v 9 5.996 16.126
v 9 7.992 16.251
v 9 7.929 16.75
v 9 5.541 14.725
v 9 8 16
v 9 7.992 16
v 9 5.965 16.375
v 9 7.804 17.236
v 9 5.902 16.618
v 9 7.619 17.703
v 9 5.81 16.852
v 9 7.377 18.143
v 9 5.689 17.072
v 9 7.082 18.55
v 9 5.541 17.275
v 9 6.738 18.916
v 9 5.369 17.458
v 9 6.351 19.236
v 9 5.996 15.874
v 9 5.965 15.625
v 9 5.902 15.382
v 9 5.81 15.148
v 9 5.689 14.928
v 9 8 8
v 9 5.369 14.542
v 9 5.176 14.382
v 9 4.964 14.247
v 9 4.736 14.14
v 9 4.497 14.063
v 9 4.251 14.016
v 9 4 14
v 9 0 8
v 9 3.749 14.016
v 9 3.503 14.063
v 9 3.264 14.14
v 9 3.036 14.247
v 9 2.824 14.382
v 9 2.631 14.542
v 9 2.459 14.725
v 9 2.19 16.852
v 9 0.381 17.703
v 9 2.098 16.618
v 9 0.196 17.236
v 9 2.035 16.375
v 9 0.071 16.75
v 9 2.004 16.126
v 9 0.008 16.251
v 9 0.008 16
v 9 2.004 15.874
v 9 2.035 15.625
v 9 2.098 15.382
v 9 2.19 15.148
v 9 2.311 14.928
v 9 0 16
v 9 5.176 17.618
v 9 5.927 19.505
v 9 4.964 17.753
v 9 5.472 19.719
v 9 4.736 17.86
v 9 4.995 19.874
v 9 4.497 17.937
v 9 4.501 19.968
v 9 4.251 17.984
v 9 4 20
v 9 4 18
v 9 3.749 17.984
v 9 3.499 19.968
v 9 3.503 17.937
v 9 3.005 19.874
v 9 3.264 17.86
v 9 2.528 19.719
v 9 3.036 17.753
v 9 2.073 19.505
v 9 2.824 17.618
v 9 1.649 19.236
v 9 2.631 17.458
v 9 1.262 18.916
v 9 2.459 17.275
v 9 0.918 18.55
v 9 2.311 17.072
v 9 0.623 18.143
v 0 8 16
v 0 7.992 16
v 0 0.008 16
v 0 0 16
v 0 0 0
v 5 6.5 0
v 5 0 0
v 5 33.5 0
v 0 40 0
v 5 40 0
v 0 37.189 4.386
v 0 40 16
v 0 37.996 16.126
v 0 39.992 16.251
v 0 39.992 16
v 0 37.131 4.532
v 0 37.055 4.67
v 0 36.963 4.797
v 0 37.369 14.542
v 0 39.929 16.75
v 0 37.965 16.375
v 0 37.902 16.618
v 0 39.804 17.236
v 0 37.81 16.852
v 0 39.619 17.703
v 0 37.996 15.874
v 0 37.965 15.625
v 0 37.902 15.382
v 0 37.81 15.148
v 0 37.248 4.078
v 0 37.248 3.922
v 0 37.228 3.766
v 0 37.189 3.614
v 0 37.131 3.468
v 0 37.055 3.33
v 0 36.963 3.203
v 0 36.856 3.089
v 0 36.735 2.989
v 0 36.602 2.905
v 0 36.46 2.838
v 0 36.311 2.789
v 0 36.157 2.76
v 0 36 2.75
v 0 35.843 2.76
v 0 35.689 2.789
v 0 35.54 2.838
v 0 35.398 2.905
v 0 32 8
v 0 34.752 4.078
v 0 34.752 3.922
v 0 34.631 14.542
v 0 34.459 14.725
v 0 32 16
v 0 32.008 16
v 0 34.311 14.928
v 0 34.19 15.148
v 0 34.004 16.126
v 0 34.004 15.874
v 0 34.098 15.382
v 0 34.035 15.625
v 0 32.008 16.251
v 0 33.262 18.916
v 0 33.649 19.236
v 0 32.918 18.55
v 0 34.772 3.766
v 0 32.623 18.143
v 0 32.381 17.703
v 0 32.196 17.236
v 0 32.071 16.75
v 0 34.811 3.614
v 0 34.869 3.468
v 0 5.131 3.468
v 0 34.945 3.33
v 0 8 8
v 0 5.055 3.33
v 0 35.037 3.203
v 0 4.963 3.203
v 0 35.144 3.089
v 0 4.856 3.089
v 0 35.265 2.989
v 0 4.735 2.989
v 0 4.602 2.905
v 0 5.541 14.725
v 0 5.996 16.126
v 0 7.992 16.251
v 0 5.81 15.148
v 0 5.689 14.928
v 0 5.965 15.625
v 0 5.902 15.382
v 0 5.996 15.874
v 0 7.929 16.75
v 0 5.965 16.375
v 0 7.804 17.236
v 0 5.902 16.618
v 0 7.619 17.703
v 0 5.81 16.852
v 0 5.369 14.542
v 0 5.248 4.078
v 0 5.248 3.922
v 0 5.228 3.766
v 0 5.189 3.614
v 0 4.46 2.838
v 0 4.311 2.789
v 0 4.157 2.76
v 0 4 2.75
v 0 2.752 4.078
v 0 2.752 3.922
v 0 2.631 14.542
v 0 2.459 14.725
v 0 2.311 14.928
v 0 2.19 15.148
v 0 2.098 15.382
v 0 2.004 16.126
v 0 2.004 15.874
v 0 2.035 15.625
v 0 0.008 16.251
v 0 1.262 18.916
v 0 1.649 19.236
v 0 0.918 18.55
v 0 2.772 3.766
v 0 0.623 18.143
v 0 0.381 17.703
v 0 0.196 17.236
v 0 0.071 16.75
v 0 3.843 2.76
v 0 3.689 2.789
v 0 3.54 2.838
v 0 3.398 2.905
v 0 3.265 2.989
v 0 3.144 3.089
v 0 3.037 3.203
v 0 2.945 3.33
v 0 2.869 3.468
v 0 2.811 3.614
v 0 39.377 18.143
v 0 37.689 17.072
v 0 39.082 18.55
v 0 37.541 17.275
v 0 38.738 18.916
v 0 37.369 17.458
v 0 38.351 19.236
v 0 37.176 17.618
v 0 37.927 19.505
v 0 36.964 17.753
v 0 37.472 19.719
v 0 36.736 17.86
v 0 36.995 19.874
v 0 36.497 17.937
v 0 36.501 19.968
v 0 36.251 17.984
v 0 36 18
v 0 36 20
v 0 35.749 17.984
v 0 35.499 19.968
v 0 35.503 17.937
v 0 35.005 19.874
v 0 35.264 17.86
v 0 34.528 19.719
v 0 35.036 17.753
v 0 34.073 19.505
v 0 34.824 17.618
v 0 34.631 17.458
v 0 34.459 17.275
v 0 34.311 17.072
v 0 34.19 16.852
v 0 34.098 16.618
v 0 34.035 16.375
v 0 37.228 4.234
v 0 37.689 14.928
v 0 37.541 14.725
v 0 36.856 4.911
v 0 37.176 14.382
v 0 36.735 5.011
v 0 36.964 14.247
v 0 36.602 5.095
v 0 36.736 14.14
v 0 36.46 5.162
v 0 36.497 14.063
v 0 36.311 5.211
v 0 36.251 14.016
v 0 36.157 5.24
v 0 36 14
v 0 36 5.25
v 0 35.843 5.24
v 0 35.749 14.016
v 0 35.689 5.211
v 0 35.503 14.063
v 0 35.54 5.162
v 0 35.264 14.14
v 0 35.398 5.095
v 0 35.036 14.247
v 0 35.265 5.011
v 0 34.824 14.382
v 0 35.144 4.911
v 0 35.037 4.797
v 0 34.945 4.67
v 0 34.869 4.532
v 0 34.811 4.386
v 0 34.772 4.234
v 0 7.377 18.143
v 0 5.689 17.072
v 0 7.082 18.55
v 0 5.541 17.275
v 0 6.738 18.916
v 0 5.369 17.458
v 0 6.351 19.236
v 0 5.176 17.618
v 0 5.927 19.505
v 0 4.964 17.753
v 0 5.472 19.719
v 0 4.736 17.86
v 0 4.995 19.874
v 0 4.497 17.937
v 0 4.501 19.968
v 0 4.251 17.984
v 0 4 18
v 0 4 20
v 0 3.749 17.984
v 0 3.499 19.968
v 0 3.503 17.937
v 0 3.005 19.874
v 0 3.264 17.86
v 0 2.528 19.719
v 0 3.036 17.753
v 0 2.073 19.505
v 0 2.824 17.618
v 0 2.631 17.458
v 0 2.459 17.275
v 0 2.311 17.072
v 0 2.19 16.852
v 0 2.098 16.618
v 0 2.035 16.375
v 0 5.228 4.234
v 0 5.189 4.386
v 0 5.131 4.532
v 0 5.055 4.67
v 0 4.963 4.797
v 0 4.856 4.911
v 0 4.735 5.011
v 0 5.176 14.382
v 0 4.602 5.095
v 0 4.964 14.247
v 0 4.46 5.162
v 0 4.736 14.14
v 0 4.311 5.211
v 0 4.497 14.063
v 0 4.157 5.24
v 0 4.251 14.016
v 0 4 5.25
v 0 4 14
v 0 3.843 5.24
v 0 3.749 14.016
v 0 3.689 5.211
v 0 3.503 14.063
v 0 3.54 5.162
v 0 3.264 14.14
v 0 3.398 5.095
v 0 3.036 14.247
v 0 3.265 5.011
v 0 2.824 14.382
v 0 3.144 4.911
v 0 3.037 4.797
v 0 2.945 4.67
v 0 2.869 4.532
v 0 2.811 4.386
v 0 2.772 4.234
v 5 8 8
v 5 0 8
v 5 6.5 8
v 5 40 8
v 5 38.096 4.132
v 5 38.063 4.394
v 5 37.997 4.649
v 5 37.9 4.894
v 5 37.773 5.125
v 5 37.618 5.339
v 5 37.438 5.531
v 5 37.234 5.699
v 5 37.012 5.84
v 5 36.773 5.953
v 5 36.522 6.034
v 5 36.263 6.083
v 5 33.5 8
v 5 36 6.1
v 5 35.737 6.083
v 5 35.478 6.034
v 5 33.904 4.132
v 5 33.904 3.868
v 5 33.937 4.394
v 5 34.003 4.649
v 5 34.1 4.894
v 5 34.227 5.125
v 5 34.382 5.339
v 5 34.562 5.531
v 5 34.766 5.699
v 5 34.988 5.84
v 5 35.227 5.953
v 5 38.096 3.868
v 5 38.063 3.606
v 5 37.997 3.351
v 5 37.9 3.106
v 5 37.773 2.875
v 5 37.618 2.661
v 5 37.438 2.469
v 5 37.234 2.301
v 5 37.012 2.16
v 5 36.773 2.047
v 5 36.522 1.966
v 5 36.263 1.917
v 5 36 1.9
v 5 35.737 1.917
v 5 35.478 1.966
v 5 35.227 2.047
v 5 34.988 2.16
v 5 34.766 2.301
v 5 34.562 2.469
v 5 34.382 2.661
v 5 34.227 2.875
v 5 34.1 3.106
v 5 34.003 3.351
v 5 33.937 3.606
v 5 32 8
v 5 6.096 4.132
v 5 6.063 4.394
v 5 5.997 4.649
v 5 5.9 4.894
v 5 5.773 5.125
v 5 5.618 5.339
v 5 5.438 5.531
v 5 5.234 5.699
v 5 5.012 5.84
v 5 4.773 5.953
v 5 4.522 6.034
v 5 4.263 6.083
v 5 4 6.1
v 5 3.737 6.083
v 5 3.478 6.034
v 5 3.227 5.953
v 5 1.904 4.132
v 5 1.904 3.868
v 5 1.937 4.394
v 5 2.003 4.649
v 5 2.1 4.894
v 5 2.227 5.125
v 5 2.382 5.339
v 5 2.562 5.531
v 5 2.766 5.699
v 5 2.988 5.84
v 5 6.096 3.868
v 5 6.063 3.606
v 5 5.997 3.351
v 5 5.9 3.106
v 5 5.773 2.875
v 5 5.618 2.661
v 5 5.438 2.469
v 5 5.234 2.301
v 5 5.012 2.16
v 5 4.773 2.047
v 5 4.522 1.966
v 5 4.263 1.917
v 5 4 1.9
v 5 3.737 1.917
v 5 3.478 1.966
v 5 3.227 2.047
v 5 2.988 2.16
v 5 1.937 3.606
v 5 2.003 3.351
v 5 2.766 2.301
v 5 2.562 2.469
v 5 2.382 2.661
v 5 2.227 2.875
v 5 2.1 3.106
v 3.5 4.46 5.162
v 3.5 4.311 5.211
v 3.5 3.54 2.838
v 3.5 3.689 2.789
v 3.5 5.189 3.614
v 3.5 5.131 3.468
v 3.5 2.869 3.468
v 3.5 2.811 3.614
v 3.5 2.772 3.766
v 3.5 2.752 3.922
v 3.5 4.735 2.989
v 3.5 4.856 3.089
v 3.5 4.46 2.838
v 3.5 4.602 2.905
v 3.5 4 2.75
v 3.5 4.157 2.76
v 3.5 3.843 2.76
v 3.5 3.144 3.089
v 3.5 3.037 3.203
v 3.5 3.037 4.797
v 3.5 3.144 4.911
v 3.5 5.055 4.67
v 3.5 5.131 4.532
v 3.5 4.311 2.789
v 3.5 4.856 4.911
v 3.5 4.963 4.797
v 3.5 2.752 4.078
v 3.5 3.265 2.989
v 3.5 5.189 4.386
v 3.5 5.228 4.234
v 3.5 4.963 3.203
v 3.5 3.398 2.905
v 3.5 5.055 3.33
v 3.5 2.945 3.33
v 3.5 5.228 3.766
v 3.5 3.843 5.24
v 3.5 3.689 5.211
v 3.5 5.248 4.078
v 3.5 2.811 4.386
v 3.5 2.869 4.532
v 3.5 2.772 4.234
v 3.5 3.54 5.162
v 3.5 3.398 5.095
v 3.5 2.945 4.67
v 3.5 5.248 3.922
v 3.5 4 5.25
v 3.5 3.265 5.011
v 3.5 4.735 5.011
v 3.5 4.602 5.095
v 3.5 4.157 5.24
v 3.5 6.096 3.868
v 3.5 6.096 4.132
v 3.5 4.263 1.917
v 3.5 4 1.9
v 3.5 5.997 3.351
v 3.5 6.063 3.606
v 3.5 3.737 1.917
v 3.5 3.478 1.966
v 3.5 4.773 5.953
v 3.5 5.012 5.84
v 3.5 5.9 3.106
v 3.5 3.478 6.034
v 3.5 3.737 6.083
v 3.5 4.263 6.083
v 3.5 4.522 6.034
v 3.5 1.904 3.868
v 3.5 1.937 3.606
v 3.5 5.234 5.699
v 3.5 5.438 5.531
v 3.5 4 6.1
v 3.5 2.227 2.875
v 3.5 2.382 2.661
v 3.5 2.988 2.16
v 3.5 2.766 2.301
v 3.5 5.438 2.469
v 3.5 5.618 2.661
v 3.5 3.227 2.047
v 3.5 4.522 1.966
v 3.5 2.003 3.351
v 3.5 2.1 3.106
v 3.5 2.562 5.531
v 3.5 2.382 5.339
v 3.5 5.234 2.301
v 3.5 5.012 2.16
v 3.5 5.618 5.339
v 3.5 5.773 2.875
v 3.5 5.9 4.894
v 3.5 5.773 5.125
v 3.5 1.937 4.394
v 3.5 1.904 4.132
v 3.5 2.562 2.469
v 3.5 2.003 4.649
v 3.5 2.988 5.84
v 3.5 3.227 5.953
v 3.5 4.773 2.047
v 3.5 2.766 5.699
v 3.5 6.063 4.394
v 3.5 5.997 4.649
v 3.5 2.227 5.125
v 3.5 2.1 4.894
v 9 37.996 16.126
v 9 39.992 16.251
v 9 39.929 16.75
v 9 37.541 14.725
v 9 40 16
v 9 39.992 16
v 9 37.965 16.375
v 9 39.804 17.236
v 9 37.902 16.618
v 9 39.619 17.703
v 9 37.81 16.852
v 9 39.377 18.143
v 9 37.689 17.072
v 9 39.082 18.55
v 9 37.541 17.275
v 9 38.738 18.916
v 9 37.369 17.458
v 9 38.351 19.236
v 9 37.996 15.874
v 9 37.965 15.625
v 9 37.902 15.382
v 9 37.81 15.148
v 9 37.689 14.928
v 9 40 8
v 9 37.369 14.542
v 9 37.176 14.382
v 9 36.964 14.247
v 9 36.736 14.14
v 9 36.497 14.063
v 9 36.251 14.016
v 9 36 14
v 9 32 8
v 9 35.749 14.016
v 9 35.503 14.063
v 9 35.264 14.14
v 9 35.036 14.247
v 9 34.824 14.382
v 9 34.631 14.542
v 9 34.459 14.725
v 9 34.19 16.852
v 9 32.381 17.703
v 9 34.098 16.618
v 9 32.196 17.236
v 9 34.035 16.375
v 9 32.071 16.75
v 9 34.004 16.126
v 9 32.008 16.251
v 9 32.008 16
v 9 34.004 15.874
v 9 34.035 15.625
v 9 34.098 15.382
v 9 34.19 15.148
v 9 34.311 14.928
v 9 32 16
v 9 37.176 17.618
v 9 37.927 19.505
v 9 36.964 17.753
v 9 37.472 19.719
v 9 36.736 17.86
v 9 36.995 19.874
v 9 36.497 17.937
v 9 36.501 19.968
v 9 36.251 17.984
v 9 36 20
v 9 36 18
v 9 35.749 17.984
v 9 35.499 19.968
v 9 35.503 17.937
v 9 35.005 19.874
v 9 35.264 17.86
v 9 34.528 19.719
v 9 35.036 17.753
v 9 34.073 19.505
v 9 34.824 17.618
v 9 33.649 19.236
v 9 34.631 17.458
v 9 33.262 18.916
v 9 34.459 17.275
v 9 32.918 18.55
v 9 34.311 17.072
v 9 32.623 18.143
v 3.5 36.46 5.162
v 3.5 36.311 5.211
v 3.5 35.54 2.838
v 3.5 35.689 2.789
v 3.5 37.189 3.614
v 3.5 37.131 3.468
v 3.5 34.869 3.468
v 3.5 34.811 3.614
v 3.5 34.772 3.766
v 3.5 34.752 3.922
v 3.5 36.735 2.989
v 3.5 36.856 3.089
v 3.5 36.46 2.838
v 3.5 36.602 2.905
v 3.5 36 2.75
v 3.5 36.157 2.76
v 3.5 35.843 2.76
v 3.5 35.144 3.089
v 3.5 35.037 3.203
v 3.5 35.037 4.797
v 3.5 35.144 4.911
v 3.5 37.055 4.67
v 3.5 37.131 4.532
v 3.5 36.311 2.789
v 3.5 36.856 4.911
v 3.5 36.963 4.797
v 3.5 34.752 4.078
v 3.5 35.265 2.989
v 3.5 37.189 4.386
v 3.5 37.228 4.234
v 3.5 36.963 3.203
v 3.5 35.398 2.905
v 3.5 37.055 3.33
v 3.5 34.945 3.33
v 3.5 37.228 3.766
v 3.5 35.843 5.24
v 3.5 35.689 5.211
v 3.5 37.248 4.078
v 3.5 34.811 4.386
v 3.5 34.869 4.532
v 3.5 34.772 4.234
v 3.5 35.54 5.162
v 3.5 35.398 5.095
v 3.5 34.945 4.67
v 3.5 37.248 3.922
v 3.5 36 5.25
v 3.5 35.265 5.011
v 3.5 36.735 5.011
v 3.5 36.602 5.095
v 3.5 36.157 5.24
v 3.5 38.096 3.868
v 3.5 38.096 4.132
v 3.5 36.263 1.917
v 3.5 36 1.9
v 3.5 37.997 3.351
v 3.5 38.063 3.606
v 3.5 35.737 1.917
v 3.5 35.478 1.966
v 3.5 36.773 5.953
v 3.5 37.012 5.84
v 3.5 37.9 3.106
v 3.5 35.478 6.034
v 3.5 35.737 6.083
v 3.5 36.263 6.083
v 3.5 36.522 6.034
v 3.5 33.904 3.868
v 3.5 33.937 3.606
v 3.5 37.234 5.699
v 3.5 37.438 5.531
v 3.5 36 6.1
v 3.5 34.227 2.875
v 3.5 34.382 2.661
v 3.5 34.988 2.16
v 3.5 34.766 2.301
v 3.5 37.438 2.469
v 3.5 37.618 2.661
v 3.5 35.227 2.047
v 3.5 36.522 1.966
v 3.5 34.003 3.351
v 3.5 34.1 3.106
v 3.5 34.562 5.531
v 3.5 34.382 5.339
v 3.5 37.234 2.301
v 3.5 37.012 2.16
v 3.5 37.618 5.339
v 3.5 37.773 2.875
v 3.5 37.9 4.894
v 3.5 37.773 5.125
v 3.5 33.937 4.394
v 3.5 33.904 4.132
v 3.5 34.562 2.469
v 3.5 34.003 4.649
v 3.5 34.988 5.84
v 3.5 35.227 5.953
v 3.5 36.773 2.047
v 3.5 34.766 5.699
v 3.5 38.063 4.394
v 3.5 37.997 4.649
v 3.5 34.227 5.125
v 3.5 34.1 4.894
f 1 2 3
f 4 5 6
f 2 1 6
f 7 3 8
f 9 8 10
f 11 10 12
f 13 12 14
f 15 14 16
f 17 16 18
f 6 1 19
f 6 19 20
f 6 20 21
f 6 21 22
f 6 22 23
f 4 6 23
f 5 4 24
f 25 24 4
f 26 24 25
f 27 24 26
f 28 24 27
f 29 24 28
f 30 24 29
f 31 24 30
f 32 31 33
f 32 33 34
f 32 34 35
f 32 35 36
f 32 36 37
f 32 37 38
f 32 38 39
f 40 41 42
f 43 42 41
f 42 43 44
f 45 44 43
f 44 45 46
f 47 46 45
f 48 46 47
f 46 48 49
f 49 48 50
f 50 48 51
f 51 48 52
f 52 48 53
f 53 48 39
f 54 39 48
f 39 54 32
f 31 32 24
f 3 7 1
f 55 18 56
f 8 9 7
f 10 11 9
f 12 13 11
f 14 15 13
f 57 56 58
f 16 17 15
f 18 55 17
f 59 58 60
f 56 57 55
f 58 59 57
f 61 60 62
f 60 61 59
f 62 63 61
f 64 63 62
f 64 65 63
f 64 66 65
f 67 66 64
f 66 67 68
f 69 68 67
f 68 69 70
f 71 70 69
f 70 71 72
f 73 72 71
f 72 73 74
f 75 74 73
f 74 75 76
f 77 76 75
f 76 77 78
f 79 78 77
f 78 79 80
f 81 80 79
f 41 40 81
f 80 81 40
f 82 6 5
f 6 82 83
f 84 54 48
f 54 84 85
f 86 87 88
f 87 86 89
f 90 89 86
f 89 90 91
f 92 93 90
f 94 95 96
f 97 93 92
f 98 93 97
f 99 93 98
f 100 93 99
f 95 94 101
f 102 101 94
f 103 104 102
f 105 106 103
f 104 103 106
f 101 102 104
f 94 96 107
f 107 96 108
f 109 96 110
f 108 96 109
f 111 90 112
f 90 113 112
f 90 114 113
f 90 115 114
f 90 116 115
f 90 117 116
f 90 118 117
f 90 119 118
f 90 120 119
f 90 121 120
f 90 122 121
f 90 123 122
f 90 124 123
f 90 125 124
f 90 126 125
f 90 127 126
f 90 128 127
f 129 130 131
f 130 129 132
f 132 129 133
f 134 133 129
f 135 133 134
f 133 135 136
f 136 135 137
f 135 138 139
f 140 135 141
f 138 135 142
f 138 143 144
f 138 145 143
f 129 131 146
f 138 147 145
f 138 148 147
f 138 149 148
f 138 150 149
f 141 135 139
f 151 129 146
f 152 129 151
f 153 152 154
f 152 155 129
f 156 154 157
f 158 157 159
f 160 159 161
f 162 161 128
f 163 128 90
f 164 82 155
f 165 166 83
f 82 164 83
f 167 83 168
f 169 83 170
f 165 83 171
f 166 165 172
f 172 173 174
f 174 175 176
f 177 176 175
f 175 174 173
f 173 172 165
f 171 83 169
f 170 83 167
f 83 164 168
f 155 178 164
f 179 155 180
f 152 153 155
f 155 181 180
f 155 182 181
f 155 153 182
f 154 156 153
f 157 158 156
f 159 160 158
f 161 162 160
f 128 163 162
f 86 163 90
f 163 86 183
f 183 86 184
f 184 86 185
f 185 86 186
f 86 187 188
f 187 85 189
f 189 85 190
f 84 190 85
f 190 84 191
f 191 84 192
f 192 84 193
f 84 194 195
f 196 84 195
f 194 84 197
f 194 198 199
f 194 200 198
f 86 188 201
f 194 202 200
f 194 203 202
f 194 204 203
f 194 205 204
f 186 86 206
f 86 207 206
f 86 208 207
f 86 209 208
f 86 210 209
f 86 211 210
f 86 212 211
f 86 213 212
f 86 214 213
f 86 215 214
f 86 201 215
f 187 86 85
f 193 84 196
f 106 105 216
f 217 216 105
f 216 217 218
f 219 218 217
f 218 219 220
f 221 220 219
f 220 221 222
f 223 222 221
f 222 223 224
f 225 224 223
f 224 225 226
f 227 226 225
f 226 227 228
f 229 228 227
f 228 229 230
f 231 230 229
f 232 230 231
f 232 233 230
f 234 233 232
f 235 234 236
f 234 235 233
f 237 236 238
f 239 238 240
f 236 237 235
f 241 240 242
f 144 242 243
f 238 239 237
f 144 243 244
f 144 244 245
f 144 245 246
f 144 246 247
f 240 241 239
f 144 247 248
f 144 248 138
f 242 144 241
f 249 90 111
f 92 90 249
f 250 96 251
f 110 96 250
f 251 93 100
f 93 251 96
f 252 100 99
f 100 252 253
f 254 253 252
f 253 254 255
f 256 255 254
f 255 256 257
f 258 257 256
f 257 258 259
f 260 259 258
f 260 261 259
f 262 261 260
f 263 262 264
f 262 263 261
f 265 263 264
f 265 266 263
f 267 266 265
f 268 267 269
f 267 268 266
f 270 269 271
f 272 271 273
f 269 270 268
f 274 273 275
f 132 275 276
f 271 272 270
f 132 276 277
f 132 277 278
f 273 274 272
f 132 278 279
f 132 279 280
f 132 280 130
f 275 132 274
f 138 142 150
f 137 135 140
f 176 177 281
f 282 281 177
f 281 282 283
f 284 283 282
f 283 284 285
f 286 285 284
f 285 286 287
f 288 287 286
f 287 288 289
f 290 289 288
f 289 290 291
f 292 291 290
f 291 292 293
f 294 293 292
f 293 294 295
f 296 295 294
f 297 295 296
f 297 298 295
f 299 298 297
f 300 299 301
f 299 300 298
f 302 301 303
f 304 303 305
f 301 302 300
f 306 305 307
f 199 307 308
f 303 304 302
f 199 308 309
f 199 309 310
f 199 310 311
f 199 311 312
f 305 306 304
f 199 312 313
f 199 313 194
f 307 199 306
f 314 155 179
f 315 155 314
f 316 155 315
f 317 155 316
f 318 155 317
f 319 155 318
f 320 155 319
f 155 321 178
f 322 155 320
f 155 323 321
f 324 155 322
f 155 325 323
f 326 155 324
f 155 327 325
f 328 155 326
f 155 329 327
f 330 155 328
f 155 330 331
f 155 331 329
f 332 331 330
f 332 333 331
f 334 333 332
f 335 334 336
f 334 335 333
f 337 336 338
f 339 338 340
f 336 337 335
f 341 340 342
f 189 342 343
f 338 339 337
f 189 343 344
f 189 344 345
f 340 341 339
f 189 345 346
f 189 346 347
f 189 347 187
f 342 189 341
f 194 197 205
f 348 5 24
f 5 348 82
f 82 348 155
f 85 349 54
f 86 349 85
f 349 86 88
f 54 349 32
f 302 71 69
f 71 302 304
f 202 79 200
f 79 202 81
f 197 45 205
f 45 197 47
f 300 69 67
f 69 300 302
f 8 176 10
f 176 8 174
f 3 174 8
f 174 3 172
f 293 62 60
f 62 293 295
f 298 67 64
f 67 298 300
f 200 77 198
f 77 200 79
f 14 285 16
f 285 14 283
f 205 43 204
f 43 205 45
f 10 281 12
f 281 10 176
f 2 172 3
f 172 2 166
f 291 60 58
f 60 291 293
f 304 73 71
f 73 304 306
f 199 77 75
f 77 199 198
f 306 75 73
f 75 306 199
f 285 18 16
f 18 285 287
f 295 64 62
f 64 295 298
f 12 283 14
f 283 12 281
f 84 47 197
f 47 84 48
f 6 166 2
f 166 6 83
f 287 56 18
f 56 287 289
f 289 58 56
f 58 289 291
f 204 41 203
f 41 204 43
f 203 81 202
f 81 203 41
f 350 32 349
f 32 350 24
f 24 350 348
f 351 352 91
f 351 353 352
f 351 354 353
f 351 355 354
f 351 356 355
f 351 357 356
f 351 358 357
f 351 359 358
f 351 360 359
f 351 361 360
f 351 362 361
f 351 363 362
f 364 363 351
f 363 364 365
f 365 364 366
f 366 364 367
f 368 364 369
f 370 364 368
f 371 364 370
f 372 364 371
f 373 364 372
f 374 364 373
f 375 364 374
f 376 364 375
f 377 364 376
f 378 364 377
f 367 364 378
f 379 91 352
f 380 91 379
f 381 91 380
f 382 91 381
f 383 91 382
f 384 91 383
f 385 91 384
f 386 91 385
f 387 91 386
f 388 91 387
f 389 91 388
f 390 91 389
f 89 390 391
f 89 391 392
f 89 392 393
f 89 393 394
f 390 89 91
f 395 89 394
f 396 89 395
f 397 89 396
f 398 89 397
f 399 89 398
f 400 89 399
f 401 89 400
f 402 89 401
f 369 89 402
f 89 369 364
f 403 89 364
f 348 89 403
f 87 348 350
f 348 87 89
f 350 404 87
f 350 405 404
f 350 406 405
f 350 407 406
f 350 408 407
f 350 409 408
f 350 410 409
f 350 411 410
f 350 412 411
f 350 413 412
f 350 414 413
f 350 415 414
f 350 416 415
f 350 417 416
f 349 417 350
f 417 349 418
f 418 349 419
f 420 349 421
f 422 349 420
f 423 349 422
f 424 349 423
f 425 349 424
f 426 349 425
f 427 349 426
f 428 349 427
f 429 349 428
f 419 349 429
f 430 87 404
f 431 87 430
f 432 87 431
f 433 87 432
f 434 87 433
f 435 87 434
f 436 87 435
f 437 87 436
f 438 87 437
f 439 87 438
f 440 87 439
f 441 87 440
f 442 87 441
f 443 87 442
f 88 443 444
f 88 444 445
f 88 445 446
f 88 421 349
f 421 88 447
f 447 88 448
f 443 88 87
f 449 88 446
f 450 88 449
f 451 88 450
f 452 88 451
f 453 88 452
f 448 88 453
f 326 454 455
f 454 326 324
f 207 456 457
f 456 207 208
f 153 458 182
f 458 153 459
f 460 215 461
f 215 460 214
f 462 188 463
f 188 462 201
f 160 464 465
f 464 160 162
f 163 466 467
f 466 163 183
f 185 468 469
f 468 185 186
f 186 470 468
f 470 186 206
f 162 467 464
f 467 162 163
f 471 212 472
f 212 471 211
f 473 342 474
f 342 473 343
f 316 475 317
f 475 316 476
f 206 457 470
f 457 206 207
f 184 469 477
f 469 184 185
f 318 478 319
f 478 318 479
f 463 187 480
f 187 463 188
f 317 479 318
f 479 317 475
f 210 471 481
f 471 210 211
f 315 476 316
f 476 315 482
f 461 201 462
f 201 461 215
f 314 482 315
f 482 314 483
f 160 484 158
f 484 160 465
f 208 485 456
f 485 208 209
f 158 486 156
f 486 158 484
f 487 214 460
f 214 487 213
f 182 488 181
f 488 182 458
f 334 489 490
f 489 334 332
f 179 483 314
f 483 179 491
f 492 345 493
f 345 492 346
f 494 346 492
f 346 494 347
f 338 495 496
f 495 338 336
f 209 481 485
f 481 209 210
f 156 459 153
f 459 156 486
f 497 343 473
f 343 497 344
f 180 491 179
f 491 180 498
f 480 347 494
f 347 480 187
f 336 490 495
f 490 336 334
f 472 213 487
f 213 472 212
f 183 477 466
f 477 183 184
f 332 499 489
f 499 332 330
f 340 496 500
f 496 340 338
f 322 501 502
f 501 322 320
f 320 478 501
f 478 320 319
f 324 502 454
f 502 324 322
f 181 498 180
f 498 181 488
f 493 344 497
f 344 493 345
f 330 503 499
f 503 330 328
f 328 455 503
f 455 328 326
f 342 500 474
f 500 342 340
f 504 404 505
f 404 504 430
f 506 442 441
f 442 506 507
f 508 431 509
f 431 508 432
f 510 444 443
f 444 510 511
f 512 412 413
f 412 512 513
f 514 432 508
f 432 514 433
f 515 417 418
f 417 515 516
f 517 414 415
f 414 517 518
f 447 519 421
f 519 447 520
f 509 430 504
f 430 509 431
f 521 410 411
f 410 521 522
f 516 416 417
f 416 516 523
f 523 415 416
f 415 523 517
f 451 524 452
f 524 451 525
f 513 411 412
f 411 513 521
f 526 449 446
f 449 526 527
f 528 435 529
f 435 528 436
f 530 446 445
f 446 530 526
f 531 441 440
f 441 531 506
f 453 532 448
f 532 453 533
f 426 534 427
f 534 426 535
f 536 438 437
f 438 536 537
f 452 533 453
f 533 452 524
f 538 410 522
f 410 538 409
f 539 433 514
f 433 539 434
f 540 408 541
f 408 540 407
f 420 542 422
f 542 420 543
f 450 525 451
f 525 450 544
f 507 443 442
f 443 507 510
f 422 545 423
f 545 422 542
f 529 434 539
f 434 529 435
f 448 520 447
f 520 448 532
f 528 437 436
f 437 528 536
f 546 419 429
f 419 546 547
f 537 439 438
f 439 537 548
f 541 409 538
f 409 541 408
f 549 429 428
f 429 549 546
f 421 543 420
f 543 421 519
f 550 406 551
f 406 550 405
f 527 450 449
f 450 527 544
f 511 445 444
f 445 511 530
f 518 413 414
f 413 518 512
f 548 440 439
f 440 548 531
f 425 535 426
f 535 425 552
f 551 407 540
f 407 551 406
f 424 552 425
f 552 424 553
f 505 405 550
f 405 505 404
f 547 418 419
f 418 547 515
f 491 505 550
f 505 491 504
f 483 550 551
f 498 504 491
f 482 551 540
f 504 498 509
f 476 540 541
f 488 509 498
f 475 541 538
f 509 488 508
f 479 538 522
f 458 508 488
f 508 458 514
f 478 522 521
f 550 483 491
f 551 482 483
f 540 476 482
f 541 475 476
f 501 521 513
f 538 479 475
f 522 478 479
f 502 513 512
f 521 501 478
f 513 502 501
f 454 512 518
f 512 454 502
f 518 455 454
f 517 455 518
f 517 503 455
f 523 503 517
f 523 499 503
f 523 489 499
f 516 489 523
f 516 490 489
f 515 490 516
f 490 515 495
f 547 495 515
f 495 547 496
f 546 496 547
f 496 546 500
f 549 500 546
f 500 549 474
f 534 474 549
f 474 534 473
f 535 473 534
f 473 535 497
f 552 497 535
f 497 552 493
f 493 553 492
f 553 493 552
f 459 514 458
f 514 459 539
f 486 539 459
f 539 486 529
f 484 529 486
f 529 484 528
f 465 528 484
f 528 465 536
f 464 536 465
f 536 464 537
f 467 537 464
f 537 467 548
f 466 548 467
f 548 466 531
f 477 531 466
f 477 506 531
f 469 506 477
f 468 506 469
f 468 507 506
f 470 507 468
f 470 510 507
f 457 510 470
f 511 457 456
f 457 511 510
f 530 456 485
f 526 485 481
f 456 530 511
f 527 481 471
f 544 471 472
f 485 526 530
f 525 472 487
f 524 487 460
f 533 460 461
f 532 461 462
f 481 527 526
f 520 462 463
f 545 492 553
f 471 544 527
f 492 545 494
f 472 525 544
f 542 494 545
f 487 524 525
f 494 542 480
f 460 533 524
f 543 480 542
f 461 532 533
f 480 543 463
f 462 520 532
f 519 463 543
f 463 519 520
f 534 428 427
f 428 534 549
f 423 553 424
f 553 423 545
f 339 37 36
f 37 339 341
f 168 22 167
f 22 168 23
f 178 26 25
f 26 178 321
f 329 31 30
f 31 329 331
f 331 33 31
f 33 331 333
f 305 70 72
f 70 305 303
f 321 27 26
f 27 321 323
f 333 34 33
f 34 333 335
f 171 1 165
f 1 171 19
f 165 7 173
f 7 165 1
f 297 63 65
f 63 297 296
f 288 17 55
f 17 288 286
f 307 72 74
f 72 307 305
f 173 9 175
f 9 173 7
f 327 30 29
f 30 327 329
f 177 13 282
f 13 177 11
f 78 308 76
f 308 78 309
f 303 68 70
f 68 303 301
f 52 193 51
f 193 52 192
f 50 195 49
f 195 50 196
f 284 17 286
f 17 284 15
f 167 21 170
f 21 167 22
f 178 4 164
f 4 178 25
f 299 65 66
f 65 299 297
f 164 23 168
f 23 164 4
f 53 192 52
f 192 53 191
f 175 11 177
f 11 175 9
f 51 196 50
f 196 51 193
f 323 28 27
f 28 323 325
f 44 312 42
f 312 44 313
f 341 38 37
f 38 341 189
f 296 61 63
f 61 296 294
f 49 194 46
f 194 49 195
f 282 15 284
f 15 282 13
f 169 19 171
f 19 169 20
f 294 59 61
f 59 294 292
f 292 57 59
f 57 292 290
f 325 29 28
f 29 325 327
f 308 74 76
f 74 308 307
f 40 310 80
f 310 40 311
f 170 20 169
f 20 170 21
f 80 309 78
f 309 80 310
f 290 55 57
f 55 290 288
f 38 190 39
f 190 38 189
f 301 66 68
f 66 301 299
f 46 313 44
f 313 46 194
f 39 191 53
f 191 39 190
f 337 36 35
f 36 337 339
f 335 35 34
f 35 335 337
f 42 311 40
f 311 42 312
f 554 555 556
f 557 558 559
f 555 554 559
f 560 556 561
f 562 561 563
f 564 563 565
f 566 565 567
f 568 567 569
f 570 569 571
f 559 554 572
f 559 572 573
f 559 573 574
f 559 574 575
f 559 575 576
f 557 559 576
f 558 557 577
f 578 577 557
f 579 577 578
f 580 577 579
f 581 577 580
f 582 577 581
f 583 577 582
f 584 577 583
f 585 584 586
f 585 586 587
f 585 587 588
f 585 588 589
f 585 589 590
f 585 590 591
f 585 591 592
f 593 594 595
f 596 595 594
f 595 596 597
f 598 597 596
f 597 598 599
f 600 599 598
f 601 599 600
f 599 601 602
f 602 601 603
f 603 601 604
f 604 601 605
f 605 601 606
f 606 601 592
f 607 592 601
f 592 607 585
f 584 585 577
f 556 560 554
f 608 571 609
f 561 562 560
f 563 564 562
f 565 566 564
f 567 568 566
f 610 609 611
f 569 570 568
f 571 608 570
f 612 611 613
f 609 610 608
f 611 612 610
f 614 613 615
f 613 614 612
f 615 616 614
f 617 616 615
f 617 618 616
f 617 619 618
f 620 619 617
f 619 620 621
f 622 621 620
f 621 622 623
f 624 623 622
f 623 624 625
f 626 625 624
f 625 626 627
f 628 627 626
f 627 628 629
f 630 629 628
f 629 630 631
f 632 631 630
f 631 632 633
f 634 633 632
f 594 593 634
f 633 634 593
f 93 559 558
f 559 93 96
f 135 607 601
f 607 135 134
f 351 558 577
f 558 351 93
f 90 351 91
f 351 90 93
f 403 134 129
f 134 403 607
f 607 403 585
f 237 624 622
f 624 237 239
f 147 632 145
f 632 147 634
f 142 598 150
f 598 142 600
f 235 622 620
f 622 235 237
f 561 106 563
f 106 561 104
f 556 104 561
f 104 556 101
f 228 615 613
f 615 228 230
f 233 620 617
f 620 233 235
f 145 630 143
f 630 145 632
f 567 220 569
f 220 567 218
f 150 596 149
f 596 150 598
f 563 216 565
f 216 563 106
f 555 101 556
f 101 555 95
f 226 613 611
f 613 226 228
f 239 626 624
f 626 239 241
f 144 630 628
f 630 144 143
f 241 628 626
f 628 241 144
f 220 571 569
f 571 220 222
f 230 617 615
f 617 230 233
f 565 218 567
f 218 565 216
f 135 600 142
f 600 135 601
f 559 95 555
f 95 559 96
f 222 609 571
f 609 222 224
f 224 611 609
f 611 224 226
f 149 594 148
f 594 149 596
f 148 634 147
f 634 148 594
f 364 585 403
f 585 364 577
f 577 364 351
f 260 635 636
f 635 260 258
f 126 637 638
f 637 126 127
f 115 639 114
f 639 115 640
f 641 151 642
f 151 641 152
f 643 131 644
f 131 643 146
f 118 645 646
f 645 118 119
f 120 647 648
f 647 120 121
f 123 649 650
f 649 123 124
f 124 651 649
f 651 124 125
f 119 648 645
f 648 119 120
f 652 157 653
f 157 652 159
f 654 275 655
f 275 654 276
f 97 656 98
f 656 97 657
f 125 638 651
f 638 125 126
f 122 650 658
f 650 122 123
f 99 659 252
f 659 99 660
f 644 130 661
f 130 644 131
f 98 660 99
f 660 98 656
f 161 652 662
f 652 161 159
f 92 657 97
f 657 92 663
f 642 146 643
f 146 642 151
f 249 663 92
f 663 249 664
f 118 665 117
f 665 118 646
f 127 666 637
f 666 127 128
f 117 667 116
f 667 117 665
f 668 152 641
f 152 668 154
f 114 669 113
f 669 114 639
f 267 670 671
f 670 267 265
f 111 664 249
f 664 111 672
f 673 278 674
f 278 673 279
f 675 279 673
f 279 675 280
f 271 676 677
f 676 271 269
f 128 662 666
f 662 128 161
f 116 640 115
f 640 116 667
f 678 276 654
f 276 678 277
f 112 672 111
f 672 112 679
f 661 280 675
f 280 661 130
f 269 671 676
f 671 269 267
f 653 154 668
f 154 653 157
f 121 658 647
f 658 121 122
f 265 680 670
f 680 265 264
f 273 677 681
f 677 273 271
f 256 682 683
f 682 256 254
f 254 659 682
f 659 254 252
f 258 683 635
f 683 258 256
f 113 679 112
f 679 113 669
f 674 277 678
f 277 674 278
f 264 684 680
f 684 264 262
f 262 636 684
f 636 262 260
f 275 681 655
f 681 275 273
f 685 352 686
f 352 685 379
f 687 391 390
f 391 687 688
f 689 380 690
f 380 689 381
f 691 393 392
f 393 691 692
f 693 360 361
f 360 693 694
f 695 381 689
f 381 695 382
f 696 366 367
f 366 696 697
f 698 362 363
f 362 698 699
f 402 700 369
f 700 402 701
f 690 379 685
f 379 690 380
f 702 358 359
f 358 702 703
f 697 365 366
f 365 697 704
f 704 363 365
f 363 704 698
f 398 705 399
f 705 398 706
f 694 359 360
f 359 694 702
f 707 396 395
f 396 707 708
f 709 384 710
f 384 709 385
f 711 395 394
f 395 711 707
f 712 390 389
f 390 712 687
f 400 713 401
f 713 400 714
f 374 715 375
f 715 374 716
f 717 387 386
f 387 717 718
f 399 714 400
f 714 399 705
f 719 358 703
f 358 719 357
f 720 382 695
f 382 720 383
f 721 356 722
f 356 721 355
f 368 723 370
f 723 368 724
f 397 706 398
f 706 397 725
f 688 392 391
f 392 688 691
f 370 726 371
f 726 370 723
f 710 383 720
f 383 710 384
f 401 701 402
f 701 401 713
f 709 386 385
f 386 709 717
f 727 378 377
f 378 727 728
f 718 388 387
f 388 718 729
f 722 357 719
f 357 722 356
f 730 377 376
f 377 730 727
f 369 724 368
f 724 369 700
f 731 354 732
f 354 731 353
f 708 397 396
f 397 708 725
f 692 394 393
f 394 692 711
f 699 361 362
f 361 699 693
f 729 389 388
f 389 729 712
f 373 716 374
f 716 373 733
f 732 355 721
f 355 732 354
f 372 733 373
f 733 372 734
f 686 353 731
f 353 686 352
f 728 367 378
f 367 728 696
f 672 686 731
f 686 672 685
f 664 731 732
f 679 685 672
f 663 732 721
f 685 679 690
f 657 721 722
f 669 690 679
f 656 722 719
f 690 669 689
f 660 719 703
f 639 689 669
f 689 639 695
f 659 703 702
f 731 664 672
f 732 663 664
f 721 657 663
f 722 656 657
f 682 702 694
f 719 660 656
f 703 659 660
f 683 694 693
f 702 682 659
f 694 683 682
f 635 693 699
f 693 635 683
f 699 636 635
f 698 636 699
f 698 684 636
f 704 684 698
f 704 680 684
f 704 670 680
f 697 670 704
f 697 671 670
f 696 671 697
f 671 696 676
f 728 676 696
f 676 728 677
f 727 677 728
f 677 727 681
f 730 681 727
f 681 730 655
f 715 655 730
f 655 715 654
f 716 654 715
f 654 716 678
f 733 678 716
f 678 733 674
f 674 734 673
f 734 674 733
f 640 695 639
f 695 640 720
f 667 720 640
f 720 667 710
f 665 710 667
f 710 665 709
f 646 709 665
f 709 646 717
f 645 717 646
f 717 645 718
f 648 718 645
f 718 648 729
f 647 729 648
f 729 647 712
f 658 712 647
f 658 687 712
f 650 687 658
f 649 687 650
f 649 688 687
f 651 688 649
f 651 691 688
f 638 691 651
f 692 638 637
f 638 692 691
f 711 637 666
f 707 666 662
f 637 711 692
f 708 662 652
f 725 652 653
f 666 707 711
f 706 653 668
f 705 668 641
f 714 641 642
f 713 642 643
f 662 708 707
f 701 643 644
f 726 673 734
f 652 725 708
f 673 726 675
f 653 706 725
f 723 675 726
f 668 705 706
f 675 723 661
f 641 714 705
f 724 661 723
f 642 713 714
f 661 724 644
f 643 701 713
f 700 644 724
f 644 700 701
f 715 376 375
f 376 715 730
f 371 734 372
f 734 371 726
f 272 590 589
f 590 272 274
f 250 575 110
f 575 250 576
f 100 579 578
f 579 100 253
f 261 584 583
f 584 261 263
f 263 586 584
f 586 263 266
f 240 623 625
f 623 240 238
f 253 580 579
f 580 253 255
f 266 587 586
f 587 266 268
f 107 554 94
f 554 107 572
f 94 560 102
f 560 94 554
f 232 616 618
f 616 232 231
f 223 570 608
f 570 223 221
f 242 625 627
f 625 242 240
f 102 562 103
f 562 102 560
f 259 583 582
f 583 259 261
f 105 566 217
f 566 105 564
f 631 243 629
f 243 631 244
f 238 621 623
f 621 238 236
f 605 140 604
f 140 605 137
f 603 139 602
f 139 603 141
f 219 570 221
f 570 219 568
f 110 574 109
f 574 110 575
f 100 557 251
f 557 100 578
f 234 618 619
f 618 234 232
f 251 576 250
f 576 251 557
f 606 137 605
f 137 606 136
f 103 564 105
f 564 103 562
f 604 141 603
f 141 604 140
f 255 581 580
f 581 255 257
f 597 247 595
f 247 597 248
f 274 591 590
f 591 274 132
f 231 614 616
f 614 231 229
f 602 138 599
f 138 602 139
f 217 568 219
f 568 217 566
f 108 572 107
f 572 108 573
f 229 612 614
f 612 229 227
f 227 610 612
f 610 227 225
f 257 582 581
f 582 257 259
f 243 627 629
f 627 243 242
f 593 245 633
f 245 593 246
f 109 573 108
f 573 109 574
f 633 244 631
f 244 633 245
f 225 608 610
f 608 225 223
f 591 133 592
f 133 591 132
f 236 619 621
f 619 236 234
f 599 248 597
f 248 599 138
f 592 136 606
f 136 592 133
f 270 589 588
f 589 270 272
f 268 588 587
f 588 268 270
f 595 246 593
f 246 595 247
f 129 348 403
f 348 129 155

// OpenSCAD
/*
Magnetic holder fan (c) by Juanjo CG (2018)

Magnetic holder fan is licensed under a
Creative Commons Attribution 3.0 Unported License.

You should have received a copy of the license along with this
work.  If not, see <http://creativecommons.org/licenses/by/3.0/>.
*/

////////////////////////////////////////////////////////////
//                    PARAMETERS
////////////////////////////////////////////////////////////
{
    fan=true;       // To print the fan part
    motor=false;    // To print the motor part
    dm = 4;         // Diameter of magnet. MAX = 10mm.
    hm = 1.5;       // High of magnet. MAX = 3.5mm
    tow1=false;     // Test tower 1
    tow2=false;     // Test tower 2
}
////////////////////////////////////////////////////////////
//                    DRAW
////////////////////////////////////////////////////////////
module tower1(){
    difference(){
        union(){
            translate ([0, 0, 0]) cube([9,8,16]);
            translate ([0, 4, 16]) rotate ([0, 90, 0]) cylinder(h=9, d=8);
            if (dm>7){
                translate ([0, 3.5-dm/2, 0]) cube([5,dm+1,dm+1]);
            }
        }
        translate ([0, 4, 16]) rotate ([0, 90, 0]) cylinder(h=9, d=4);

        if (dm<=7){
            translate ([5, 0, 0]) cube([4,8,8]);
            translate ([0, 4, 4]) rotate ([0, 90, 0]) cylinder(h=9, d=2.5);
            translate ([5-hm, 4, 4]) rotate ([0, 90, 0]) cylinder(h=6, d=dm+0.2);
        }
        else{
            translate ([5, 0, 0]) cube([4,8,dm+1]);
            translate ([0, 4, dm/2+0.5]) rotate ([0, 90, 0]) cylinder(h=9, d=2.5);
            translate ([5-hm, 4, dm/2+0.5]) rotate ([0, 90, 0]) cylinder(h=6, d=dm+0.2);
        }
    }
}
if(tow1) tower1();
module tower2(){
    translate ([0,0,0])
    rotate ([0,0,0])
    if (dm<=7){
        difference(){
            translate ([0, 0, 0]) cube([4,8,8]);
            translate ([0, 4, 4]) rotate ([0, 90, 0]) cylinder(h=5, d=2.5);
            translate ([0, 4, 4]) rotate ([0, 90, 0]) cylinder(h=hm, d=dm+0.2);
        }
    }
    else {
        difference(){
            translate ([0, 3.5-dm/2, 0]) cube([4,dm+1,dm+1]);
            translate ([0, 4, dm/2+0.5]) rotate ([0, 90, 0]) cylinder(h=5, d=2.5);
            translate ([0, 4, dm/2+0.5]) rotate ([0, 90, 0]) cylinder(h=hm, d=dm+0.2);
        }
    }
}
if(tow2) tower2();
{
$fn=50;
if(fan){
    translate ([0, 4+dm/2+0.5, 0]) cube ([5, 32-(dm+1), 8]);
    translate ([0, 00, 0]) tower1();
    translate ([0, 32, 0]) tower1();
}

if(motor){
    difference(){
        union(){
            translate ([05, 4+dm/2+0.5, 00]) cube([04,32-(dm+1),3]); // |  
            translate ([08, 16, 00]) cube([34,08,3]); // - caña 1
            translate ([35, 16, 00]) cube([13,08,3]); // - caña 2
            translate ([48, 07, 00]) cube([05,26,09]);// | medio
            translate ([48, 07, 00]) cube([17,05,09]);// - inf
            translate ([48, 28, 00]) cube([17,05,09]);// - sup
            translate ([65, 07, 00]) cube([03,26,15]);// | final
            translate ([5, 00, 0]) tower2();
            translate ([5, 32, 0]) tower2();
        }
        translate ([62, 11.5, 00]) cube([03,17,15]);
        translate ([65, 20, 10]) rotate ([0, 90, 0]) cylinder(h=5, d=5);
    }
}
}
